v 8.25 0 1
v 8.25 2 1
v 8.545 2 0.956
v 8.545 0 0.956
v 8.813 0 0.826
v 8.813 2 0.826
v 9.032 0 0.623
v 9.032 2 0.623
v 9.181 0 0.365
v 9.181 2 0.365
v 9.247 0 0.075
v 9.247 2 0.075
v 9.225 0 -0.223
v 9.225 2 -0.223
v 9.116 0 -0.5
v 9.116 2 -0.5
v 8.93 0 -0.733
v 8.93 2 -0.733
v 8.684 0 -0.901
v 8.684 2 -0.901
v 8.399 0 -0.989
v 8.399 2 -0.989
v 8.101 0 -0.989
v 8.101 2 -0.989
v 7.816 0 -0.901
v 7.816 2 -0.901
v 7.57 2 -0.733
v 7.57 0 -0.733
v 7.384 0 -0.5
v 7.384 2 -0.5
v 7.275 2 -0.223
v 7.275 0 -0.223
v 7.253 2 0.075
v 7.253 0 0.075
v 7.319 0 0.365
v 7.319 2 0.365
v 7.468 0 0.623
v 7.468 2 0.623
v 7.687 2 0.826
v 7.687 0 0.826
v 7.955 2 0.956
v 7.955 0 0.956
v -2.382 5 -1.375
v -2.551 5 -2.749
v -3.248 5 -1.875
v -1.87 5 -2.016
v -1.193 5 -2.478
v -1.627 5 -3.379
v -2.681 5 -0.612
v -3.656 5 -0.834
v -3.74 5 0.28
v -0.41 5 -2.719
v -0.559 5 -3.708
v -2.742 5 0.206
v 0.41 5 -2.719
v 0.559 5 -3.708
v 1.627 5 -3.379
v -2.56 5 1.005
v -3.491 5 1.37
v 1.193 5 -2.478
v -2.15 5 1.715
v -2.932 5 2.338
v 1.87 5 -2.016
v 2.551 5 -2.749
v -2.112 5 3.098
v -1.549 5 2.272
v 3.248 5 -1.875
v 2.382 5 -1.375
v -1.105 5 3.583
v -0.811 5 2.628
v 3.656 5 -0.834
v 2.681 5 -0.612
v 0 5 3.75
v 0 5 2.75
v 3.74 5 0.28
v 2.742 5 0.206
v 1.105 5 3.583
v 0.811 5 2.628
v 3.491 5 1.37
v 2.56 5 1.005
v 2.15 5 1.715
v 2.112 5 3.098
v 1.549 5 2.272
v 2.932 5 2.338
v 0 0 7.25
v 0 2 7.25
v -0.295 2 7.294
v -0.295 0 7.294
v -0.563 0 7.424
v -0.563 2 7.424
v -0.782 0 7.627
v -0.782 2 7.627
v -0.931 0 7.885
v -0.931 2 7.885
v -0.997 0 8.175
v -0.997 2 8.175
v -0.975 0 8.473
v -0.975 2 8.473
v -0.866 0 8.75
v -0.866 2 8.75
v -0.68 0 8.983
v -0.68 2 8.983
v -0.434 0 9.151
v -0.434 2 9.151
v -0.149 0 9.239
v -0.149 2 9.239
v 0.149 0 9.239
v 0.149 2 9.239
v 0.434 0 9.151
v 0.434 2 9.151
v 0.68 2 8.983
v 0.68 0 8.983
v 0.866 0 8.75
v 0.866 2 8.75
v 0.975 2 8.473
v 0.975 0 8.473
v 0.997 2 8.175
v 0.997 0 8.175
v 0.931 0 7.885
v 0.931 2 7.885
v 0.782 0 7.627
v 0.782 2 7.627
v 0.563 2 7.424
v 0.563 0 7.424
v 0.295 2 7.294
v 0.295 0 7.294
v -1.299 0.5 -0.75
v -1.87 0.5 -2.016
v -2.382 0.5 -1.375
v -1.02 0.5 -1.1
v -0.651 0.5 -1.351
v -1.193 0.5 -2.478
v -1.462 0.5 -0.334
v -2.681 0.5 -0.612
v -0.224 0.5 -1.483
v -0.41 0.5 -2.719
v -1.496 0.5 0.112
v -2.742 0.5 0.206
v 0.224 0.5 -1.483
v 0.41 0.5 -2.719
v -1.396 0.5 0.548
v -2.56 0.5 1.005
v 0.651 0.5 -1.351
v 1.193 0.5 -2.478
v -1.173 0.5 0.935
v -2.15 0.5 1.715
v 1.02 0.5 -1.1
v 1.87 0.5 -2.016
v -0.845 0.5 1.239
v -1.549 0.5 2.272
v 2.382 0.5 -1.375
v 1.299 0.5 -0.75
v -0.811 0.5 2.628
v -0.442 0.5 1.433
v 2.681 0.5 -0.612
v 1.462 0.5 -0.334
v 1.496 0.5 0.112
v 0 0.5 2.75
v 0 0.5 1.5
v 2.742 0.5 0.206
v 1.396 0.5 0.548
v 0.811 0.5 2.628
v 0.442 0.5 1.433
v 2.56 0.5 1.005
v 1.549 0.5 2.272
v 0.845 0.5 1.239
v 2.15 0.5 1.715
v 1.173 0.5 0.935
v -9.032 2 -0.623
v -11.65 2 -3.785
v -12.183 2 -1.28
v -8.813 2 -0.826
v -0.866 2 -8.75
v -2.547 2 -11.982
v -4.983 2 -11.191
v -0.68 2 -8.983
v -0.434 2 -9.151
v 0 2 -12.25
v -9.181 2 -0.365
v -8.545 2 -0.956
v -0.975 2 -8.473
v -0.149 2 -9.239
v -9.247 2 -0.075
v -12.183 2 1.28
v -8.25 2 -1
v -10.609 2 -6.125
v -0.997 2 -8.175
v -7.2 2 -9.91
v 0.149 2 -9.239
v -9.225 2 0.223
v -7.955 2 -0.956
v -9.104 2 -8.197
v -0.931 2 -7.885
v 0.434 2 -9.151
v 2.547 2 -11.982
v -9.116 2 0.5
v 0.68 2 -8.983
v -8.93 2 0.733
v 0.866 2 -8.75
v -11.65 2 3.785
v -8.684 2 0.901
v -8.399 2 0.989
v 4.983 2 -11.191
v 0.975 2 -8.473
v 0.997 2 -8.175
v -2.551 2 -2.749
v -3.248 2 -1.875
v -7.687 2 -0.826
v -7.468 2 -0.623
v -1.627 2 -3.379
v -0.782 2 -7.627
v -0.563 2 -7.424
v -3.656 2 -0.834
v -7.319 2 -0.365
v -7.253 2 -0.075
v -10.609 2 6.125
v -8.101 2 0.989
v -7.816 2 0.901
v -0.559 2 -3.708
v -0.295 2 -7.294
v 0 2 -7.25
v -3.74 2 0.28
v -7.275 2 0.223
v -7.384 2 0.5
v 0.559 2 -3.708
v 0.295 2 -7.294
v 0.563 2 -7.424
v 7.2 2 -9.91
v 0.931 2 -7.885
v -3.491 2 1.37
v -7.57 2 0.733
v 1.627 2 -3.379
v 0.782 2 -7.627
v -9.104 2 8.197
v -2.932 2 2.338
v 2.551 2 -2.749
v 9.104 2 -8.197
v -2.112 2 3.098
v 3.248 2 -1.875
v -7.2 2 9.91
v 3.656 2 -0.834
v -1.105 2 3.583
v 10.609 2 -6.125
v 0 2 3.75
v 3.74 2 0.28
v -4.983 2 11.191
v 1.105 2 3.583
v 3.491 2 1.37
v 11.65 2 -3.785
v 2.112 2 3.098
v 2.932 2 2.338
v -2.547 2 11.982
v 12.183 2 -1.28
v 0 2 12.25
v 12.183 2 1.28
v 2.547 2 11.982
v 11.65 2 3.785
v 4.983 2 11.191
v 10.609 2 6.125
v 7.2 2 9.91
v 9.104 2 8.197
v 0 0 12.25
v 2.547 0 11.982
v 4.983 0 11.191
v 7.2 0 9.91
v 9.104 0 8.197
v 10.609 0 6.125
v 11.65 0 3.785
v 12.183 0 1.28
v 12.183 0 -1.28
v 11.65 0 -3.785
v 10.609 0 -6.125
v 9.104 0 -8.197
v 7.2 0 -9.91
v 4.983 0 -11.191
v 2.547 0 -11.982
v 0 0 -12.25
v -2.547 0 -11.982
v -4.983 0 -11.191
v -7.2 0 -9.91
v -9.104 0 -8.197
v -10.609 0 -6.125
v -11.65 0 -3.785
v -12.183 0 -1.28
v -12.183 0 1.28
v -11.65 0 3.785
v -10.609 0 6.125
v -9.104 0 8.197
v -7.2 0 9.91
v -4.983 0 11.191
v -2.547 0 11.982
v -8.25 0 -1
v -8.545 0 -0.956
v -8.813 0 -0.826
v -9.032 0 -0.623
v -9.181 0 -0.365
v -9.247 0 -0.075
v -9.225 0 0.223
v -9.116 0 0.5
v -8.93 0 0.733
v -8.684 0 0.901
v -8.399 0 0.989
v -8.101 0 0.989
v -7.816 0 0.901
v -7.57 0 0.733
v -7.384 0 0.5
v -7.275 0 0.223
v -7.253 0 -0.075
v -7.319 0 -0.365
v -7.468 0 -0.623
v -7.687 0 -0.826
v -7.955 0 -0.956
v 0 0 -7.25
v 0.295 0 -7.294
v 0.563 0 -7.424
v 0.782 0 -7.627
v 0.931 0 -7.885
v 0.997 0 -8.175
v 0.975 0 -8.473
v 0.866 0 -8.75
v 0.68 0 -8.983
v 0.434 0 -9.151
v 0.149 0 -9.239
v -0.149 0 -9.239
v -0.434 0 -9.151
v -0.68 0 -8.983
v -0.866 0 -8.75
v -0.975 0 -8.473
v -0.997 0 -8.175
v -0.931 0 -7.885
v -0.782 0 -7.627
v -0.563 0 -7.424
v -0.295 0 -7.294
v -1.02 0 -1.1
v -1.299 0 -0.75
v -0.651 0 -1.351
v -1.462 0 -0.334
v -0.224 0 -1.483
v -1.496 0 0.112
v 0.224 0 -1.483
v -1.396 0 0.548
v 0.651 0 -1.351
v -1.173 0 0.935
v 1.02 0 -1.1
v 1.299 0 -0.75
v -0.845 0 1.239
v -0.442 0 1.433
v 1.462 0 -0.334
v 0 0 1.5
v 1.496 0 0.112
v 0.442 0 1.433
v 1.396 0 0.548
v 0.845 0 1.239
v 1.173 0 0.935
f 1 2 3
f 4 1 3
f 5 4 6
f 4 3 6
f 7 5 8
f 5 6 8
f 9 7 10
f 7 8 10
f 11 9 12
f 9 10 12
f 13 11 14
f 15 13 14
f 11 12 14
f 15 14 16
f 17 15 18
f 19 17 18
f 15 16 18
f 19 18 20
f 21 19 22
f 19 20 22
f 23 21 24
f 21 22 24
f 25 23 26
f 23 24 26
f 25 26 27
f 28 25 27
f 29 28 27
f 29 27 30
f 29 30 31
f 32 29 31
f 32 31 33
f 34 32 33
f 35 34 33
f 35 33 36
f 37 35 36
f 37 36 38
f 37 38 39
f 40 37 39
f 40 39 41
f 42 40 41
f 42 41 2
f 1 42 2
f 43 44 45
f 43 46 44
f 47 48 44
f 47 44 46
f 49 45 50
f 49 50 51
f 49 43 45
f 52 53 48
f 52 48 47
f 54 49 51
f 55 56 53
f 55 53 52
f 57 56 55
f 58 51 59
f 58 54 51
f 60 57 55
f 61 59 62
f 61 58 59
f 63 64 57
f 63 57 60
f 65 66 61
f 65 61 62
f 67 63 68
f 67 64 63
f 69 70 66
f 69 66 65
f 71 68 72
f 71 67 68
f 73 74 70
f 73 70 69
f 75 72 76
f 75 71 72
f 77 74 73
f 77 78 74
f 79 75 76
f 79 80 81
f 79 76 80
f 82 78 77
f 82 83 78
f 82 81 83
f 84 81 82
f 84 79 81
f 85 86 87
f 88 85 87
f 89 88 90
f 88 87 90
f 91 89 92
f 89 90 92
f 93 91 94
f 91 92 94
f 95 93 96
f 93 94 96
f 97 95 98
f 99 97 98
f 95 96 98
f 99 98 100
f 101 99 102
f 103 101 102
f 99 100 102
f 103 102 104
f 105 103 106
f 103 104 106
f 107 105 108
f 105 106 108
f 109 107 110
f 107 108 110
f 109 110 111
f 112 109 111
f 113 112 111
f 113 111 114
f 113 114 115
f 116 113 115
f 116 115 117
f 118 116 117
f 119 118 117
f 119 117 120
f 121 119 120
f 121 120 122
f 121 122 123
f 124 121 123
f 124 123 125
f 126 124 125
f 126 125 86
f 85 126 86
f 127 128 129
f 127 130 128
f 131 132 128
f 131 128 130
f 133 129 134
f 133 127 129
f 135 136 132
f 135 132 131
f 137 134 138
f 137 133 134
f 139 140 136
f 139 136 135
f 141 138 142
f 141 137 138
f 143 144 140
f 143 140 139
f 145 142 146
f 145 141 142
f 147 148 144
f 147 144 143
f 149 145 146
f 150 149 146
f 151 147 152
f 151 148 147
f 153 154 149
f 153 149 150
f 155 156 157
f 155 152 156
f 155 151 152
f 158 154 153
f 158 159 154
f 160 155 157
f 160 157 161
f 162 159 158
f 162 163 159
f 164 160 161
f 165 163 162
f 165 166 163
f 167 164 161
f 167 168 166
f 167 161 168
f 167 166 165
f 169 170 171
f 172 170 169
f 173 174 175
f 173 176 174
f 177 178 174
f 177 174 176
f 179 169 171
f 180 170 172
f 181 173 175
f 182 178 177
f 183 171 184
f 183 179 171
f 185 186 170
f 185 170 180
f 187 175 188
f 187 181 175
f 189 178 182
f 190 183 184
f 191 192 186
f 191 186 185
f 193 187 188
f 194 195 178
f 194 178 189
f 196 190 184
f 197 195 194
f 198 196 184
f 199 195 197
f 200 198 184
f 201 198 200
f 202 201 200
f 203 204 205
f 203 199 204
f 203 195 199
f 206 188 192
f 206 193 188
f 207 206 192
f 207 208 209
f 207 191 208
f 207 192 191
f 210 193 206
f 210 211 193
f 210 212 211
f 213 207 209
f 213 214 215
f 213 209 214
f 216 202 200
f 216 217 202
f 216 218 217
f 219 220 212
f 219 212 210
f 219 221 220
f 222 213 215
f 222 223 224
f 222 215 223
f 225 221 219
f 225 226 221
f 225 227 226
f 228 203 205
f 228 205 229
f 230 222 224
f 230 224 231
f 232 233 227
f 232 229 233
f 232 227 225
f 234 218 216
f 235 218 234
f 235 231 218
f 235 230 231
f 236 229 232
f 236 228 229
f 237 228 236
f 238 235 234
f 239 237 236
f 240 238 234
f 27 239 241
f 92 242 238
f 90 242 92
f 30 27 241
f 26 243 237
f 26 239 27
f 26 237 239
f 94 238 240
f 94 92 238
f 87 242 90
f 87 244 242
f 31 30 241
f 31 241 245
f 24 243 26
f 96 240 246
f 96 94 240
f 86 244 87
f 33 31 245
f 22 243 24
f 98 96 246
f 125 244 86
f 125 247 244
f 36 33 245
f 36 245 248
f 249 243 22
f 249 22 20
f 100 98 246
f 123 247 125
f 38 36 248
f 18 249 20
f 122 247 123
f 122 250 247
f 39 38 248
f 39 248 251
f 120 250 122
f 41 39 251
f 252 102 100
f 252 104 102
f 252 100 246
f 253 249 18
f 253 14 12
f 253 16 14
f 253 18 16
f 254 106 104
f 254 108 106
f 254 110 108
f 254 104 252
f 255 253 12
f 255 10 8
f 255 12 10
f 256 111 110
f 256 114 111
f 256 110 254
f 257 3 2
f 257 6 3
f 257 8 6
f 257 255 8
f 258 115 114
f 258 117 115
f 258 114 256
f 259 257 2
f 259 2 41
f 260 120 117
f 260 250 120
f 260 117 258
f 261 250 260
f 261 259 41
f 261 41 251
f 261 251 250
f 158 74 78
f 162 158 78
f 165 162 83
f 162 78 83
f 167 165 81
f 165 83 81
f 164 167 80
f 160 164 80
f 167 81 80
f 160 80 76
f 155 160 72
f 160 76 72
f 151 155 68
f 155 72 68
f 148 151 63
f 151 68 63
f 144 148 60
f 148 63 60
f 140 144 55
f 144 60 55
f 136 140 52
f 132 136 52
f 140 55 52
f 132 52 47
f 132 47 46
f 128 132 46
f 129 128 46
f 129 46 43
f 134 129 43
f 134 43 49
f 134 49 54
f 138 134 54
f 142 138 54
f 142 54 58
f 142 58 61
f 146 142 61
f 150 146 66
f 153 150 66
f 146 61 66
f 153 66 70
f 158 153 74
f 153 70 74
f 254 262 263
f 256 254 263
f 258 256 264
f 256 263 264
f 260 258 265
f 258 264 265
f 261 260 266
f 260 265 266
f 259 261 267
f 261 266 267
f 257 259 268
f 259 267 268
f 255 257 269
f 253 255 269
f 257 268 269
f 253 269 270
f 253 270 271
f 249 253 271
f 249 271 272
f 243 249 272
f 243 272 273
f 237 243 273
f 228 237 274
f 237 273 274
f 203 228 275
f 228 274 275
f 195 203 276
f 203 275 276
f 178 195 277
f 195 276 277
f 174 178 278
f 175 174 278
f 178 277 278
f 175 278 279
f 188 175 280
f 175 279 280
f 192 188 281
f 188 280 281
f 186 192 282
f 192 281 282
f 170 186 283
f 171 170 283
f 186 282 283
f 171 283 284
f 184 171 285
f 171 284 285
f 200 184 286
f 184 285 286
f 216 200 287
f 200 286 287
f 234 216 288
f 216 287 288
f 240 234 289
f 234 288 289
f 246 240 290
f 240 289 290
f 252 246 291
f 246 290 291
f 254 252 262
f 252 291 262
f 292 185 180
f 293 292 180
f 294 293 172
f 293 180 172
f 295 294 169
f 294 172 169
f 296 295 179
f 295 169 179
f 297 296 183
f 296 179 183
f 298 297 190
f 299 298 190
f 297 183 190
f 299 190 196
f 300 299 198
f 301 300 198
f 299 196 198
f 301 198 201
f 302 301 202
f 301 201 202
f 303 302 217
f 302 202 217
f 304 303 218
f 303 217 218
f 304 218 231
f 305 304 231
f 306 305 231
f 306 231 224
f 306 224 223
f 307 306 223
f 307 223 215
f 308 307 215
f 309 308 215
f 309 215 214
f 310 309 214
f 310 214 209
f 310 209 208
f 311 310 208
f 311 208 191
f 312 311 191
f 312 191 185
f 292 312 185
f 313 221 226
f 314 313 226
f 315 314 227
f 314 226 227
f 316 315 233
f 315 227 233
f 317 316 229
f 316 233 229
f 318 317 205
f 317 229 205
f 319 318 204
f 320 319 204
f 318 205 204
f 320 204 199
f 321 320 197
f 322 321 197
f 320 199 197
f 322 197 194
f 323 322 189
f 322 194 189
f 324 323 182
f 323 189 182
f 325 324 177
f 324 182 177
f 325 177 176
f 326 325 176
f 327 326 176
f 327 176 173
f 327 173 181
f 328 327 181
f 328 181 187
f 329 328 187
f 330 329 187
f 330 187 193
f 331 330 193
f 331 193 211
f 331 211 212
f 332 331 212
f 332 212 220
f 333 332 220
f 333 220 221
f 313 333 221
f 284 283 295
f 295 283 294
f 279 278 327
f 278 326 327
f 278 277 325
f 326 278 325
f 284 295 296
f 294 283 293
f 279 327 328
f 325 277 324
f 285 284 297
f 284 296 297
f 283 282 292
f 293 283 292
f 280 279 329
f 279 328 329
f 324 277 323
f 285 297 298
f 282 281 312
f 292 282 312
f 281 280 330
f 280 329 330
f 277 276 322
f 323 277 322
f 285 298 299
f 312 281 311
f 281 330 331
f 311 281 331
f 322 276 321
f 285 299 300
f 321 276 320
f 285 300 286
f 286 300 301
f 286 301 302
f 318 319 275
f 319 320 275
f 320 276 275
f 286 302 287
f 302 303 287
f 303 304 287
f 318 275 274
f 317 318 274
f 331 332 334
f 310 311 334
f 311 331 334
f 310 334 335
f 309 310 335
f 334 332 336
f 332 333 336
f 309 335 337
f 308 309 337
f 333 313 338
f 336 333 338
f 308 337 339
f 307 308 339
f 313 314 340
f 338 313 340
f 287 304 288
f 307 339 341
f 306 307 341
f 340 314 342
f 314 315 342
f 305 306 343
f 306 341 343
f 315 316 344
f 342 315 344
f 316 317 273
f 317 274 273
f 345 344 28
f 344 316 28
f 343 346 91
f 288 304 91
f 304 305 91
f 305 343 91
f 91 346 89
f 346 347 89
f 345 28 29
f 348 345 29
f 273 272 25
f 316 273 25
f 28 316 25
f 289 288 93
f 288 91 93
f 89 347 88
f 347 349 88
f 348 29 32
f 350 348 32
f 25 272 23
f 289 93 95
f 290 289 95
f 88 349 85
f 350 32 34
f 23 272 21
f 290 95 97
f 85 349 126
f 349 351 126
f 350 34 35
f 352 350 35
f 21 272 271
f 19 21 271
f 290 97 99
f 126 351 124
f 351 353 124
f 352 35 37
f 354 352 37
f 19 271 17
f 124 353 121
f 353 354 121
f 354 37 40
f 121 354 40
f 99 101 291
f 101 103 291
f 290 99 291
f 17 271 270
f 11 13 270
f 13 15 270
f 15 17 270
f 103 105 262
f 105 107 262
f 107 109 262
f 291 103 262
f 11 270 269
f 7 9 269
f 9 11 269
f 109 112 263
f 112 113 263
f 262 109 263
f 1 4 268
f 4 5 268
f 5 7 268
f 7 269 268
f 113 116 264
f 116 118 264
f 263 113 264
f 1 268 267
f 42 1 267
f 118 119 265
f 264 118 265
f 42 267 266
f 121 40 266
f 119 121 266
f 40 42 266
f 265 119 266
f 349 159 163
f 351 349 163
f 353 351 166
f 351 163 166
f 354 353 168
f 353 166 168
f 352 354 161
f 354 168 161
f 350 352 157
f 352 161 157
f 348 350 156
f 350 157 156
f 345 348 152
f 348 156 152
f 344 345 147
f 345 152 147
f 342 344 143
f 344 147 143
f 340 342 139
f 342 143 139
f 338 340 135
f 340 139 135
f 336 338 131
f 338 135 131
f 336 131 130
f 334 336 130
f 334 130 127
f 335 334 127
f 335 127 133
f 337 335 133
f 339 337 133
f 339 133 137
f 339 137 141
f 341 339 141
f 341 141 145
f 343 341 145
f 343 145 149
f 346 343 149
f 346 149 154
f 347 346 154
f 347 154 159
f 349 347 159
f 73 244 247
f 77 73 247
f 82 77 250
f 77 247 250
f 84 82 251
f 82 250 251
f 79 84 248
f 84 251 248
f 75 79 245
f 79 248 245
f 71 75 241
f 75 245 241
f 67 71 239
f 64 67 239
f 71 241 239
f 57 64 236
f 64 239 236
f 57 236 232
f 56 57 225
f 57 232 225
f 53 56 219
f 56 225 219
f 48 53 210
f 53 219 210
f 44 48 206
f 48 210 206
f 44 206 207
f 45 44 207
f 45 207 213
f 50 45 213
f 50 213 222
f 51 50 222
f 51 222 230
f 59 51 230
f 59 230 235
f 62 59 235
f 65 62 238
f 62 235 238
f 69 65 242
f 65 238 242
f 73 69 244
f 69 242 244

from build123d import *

# Parameters (mm, degrees)
SKETCH2_R           = 12.25
BOSS_EXTRUDE1_DEPTH = 2
SKETCH3_R           = 1
CUT_EXTRUDE1_DEPTH  = 18.439180027
SKETCH4_R           = 3.75
BOSS_EXTRUDE2_DEPTH = 3
SKETCH5_R           = 1.5
CUT_EXTRUDE2_DEPTH  = 19.03122292
SKETCH6_R           = 2.75
CUT_EXTRUDE3_DEPTH  = 4.5


with BuildPart() as part:
    # Sketch2 → Boss-Extrude1 (new body)
    with BuildSketch(Plane(origin=(0, 0, 0), x_dir=(1, 0, 0), z_dir=(0, 1, 0))):
        with Locations(Location((0, 0, 0), (0, 0, 270))):
            Circle(SKETCH2_R)
    extrude(amount=BOSS_EXTRUDE1_DEPTH)

    # Sketch3 → Cut-Extrude1 (cut, through all)
    with BuildSketch(Plane(origin=(0, 2, 0), x_dir=(1, 0, 0), z_dir=(0, 1, 0))):
        with Locations(Location((0, 8.25, 0), (0, 0, 270))):
            Circle(SKETCH3_R)
        with Locations(Location((8.25, 0, 0), (0, 0, 270))):
            Circle(SKETCH3_R)
        with Locations(Location((0, -8.25, 0), (0, 0, 90))):
            Circle(SKETCH3_R)
        with Locations(Location((-8.25, 0, 0), (0, 0, 90))):
            Circle(SKETCH3_R)
    extrude(amount=-CUT_EXTRUDE1_DEPTH, mode=Mode.SUBTRACT)

    # Sketch4 → Boss-Extrude2 (add)
    with BuildSketch(Plane(origin=(0, 2, 0), x_dir=(1, 0, 0), z_dir=(0, 1, 0))):
        with Locations(Location((0, 0, 0), (0, 0, 270))):
            Circle(SKETCH4_R)
    extrude(amount=BOSS_EXTRUDE2_DEPTH)

    # Sketch5 → Cut-Extrude2 (cut, through all)
    with BuildSketch(Plane(origin=(0, 5, 0), x_dir=(1, 0, 0), z_dir=(0, 1, 0))):
        with Locations(Location((0, 0, 0), (0, 0, 270))):
            Circle(SKETCH5_R)
    extrude(amount=-CUT_EXTRUDE2_DEPTH, mode=Mode.SUBTRACT)

    # Sketch6 → Cut-Extrude3 (cut)
    with BuildSketch(Plane(origin=(0, 5, 0), x_dir=(1, 0, 0), z_dir=(0, 1, 0))):
        with Locations(Location((0, 0, 0), (0, 0, 270))):
            Circle(SKETCH6_R)
    extrude(amount=-CUT_EXTRUDE3_DEPTH, mode=Mode.SUBTRACT)


solid = part.part
